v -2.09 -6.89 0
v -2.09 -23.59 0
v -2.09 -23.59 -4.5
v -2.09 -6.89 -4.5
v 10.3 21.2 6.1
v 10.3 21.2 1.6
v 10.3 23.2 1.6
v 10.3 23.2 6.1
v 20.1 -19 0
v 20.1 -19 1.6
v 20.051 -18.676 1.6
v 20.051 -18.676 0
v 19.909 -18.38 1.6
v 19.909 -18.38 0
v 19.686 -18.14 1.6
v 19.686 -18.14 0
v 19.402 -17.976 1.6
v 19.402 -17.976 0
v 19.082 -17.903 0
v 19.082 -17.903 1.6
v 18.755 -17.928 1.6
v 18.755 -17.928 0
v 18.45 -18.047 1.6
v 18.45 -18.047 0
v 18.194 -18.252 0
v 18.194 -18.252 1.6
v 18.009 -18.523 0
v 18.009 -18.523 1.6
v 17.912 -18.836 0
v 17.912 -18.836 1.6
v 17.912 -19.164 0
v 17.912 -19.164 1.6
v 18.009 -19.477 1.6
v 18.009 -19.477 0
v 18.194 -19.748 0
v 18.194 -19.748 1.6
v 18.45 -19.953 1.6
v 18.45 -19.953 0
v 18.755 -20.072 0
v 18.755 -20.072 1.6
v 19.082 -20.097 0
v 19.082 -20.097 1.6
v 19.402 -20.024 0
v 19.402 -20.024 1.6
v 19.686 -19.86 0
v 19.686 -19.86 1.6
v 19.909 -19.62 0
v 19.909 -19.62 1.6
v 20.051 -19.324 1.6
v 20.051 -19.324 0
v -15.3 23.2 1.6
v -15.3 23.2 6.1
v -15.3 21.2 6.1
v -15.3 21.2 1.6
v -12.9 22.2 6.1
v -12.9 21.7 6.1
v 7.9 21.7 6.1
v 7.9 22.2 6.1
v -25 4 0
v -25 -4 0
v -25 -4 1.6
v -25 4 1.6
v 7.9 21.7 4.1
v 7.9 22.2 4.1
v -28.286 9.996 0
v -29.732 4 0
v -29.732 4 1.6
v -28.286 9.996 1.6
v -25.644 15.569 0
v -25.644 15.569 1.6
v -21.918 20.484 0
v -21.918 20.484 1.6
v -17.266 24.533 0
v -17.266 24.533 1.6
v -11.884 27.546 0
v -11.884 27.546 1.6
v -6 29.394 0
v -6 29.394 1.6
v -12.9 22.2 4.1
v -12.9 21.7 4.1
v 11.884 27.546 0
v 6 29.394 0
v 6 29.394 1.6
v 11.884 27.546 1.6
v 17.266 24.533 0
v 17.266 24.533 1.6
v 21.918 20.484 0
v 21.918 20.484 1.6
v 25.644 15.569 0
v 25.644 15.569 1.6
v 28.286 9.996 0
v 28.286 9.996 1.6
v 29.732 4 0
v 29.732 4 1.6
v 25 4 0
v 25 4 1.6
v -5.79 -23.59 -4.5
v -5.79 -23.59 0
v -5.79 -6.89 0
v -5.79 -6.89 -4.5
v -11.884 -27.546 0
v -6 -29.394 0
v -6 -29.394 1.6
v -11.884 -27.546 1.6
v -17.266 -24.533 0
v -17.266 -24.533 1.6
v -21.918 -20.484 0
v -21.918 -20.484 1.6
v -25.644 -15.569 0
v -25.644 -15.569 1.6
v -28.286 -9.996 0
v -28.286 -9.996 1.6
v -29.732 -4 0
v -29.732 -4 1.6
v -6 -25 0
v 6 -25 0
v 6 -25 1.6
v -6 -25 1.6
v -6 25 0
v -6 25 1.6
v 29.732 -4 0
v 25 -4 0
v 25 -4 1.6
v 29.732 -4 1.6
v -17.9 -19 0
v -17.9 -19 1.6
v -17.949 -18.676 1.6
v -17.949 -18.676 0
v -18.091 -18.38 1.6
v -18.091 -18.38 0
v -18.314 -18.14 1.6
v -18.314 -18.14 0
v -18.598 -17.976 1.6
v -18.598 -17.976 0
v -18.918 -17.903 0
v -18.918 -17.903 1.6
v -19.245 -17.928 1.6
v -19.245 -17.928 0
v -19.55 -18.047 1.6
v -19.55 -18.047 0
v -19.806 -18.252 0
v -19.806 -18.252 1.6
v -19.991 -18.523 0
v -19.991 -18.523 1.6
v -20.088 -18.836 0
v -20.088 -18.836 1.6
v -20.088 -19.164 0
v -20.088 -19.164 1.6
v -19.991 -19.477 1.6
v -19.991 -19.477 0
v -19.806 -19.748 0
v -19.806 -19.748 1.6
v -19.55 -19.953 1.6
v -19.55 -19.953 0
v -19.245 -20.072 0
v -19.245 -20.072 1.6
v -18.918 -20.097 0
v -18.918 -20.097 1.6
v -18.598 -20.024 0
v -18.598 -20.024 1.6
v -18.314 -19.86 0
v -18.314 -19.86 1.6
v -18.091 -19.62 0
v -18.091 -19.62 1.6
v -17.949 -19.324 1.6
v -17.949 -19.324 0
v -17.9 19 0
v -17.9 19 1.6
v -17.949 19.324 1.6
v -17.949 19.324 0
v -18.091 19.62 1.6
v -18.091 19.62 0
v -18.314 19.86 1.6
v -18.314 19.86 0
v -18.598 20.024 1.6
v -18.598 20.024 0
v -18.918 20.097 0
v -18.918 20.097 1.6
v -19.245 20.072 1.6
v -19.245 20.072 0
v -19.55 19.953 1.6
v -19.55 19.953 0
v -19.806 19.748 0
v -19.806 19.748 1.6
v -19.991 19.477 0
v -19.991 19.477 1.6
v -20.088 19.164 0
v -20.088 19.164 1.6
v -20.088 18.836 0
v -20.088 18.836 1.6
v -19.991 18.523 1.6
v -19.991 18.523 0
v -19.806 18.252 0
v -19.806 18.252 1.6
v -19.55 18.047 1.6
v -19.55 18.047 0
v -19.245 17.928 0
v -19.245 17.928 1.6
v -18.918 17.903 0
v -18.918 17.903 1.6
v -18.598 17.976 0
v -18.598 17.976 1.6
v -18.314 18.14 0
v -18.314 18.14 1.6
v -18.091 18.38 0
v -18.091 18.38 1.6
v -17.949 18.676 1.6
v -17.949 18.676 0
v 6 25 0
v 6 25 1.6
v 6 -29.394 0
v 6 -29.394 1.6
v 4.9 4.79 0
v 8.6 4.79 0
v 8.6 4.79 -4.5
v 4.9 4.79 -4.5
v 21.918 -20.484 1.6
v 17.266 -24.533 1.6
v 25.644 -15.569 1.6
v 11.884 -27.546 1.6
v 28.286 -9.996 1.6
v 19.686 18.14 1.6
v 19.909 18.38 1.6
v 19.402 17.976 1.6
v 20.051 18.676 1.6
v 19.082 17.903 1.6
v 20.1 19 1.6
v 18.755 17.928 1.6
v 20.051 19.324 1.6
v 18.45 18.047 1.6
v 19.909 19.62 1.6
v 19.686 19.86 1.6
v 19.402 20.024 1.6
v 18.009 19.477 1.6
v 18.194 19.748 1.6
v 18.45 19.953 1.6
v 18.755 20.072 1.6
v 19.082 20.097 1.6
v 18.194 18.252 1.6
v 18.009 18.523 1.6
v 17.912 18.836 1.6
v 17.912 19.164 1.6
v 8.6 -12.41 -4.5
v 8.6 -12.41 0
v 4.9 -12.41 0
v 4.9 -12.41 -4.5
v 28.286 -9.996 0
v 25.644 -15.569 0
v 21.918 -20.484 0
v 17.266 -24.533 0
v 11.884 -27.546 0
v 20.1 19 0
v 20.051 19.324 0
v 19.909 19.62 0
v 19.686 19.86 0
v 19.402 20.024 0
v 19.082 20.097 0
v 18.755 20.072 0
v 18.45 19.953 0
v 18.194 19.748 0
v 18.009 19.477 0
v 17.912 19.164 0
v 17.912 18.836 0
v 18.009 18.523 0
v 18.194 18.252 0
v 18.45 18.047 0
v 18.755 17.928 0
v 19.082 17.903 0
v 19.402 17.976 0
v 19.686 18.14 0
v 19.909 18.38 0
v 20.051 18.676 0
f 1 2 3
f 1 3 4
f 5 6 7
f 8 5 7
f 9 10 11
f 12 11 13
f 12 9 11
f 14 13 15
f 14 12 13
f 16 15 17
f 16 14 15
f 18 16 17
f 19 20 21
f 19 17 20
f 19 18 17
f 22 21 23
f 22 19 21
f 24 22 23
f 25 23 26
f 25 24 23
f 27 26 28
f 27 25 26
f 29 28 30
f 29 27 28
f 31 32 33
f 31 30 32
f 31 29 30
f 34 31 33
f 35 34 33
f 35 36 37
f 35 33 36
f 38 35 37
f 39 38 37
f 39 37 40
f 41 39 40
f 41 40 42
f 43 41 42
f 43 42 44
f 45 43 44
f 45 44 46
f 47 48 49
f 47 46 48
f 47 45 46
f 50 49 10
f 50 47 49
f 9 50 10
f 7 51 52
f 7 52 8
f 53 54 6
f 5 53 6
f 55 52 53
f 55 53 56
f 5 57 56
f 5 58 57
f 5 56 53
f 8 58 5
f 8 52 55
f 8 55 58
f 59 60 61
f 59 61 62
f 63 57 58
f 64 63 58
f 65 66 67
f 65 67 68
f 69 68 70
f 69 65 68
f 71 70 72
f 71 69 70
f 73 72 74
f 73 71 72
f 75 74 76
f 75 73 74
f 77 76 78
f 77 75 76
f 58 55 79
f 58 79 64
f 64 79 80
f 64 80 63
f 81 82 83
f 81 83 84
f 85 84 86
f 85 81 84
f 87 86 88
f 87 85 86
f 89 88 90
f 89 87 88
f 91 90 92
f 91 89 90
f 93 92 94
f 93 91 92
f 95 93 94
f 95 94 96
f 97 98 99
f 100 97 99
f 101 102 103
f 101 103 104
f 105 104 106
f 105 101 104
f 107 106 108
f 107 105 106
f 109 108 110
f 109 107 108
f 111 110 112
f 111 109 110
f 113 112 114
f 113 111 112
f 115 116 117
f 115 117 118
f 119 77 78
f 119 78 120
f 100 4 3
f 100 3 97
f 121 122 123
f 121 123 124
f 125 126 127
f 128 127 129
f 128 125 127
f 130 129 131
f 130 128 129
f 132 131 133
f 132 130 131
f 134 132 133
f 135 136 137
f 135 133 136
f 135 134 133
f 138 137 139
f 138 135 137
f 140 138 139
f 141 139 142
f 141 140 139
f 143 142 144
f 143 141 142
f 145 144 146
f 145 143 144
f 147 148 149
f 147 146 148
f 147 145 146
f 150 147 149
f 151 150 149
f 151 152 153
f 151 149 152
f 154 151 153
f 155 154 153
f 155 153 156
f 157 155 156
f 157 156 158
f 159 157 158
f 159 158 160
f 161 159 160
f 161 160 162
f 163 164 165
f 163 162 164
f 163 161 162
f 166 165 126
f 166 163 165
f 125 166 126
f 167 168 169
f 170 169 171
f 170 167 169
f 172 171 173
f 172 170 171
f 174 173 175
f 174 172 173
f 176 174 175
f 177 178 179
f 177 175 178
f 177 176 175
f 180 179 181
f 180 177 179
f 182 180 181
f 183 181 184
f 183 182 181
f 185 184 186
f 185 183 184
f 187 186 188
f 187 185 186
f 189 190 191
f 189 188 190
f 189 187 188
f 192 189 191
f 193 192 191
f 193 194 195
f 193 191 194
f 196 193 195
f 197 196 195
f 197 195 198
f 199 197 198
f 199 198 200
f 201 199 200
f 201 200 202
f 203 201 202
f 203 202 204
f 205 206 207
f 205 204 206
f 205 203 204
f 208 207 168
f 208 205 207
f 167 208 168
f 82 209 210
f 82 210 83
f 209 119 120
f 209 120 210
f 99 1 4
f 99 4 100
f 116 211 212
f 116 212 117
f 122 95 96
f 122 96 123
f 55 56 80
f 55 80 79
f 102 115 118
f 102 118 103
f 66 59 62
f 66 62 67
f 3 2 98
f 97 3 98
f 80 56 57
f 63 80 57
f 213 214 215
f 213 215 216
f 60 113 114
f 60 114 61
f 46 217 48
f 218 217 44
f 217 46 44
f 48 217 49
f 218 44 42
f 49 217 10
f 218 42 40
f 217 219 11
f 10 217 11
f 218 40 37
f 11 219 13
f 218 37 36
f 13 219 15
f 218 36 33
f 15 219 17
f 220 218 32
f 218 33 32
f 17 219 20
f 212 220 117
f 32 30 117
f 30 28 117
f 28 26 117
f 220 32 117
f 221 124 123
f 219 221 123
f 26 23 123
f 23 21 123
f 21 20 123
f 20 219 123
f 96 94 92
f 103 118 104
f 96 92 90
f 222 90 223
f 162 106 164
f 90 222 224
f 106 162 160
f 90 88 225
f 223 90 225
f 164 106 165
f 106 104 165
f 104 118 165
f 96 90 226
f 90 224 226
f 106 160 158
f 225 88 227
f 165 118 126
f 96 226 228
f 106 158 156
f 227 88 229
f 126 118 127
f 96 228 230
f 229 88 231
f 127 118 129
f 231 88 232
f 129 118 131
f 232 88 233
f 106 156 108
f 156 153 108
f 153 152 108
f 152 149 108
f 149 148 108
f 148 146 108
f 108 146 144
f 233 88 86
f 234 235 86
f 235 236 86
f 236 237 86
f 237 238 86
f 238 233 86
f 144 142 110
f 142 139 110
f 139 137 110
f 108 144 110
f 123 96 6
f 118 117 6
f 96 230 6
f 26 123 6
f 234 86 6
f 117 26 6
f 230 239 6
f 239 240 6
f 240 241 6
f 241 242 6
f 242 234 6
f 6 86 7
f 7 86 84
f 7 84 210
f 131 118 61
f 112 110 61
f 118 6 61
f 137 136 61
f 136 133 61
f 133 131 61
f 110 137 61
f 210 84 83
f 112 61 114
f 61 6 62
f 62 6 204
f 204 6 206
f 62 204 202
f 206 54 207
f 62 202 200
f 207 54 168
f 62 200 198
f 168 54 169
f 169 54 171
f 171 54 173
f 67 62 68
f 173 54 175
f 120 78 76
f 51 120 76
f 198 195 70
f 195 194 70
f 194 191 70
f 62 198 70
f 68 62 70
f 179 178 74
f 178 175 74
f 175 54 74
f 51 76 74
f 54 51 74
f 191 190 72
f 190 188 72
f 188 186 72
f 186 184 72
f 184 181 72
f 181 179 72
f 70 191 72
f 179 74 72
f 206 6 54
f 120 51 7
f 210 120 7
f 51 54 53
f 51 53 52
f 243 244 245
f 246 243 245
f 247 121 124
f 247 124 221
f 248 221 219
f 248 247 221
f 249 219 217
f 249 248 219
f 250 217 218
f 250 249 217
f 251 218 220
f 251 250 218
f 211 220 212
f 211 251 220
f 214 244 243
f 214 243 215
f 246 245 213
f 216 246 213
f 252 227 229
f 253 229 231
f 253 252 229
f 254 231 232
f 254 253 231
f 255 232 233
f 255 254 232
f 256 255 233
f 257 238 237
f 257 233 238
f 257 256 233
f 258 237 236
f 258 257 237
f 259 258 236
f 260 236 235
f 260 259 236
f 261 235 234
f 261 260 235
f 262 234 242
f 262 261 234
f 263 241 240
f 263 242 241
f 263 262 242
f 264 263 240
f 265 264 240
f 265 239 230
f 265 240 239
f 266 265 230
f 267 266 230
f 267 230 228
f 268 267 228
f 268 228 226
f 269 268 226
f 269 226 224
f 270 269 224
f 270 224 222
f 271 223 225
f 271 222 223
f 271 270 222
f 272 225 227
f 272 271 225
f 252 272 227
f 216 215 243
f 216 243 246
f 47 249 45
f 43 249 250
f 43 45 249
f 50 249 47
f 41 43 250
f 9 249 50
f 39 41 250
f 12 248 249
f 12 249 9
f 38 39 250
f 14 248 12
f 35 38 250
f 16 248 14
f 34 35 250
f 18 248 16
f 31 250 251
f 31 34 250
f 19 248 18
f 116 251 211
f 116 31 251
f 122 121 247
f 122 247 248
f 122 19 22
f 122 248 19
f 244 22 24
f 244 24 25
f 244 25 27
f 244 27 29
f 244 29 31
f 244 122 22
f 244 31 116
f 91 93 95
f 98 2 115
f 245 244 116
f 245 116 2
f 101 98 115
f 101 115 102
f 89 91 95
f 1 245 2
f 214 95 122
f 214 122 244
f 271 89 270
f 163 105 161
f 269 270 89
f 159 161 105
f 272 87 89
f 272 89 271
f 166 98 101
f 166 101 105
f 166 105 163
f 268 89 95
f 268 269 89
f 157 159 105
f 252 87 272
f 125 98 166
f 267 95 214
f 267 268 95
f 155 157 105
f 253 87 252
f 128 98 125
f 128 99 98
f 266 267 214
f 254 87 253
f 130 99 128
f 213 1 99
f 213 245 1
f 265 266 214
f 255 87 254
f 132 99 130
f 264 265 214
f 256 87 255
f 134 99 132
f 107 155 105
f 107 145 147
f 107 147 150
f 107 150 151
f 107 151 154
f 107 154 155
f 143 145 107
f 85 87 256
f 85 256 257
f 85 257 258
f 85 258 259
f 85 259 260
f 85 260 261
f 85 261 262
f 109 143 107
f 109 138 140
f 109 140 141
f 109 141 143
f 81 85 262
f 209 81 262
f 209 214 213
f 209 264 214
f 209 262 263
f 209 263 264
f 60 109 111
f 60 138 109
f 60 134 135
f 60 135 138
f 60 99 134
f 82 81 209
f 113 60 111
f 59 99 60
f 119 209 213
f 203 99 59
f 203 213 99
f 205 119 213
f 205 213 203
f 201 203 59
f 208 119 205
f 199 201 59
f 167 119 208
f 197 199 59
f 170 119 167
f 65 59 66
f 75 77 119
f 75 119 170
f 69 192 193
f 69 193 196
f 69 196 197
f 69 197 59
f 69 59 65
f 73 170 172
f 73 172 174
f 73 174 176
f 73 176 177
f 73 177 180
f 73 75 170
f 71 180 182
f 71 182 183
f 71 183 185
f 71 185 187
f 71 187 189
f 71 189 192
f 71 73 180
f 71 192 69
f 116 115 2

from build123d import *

# Parameters (mm, degrees)
BOSS_EXTRUDE1_DEPTH = 1.6
SKETCH2_R           = 1.1
CUT_EXTRUDE1_DEPTH  = 42.839694072
SKETCH3_W           = 25.6
SKETCH3_H           = 2
BOSS_EXTRUDE2_DEPTH = 4.5
SKETCH4_W           = 20.8
SKETCH4_H           = 0.5
CUT_EXTRUDE2_DEPTH  = 2
SKETCH5_W           = 3.7
SKETCH5_H           = 17.2
SKETCH5_H_2         = 16.7
BOSS_EXTRUDE3_DEPTH = 4.5


with BuildPart() as part:
    # Sketch1 → Boss-Extrude1 (new body)
    with BuildSketch(Plane.XY):
        with BuildLine():
            Line((-6, 29.393876913), (-6, 25))
            Line((-6, 25), (6, 25))
            Line((6, 25), (6, 29.393876913))
            ThreePointArc((6, 29.393876913), (21.918226631, 20.483928855), (29.732137495, 4))
            Line((29.732137495, 4), (25, 4))
            Line((25, 4), (25, -4))
            Line((25, -4), (29.732137495, -4))
            ThreePointArc((29.732137495, -4), (21.918226631, -20.483928855), (6, -29.393876913))
            Line((6, -29.393876913), (6, -25))
            Line((6, -25), (-6, -25))
            Line((-6, -25), (-6, -29.393876913))
            ThreePointArc((-6, -29.393876913), (-21.918226631, -20.483928855), (-29.732137495, -4))
            Line((-29.732137495, -4), (-25, -4))
            Line((-25, -4), (-25, 4))
            Line((-25, 4), (-29.732137495, 4))
            ThreePointArc((-29.732137495, 4), (-21.918226631, 20.483928855), (-6, 29.393876913))
        make_face()
    extrude(amount=BOSS_EXTRUDE1_DEPTH)

    # Sketch2 → Cut-Extrude1 (cut, through all)
    with BuildSketch(Plane.XY):
        with Locations((-19, 19)):
            Circle(SKETCH2_R)
        with Locations((19, 19)):
            Circle(SKETCH2_R)
        with Locations((19, -19)):
            Circle(SKETCH2_R)
        with Locations((-19, -19)):
            Circle(SKETCH2_R)
    extrude(amount=CUT_EXTRUDE1_DEPTH, mode=Mode.SUBTRACT)

    # Sketch3 → Boss-Extrude2 (add)
    with BuildSketch(Plane.XY.offset(1.6)):
        with Locations((-2.5, 22.2)):
            Rectangle(SKETCH3_W, SKETCH3_H)
    extrude(amount=BOSS_EXTRUDE2_DEPTH)

    # Sketch4 → Cut-Extrude2 (cut)
    with BuildSketch(Plane.XY.offset(6.1)):
        with Locations((-2.5, 21.95)):
            Rectangle(SKETCH4_W, SKETCH4_H)
    extrude(amount=-CUT_EXTRUDE2_DEPTH, mode=Mode.SUBTRACT)

    # Sketch5 → Boss-Extrude3 (add)
    with BuildSketch(Plane(origin=(0, 0, 0), x_dir=(-1, 0, 0), z_dir=(0, 0, -1))):
        with Locations((-6.75, -3.81)):
            Rectangle(SKETCH5_W, SKETCH5_H)
        with Locations((3.94, -15.24)):
            Rectangle(SKETCH5_W, SKETCH5_H_2)
    extrude(amount=BOSS_EXTRUDE3_DEPTH)


solid = part.part
